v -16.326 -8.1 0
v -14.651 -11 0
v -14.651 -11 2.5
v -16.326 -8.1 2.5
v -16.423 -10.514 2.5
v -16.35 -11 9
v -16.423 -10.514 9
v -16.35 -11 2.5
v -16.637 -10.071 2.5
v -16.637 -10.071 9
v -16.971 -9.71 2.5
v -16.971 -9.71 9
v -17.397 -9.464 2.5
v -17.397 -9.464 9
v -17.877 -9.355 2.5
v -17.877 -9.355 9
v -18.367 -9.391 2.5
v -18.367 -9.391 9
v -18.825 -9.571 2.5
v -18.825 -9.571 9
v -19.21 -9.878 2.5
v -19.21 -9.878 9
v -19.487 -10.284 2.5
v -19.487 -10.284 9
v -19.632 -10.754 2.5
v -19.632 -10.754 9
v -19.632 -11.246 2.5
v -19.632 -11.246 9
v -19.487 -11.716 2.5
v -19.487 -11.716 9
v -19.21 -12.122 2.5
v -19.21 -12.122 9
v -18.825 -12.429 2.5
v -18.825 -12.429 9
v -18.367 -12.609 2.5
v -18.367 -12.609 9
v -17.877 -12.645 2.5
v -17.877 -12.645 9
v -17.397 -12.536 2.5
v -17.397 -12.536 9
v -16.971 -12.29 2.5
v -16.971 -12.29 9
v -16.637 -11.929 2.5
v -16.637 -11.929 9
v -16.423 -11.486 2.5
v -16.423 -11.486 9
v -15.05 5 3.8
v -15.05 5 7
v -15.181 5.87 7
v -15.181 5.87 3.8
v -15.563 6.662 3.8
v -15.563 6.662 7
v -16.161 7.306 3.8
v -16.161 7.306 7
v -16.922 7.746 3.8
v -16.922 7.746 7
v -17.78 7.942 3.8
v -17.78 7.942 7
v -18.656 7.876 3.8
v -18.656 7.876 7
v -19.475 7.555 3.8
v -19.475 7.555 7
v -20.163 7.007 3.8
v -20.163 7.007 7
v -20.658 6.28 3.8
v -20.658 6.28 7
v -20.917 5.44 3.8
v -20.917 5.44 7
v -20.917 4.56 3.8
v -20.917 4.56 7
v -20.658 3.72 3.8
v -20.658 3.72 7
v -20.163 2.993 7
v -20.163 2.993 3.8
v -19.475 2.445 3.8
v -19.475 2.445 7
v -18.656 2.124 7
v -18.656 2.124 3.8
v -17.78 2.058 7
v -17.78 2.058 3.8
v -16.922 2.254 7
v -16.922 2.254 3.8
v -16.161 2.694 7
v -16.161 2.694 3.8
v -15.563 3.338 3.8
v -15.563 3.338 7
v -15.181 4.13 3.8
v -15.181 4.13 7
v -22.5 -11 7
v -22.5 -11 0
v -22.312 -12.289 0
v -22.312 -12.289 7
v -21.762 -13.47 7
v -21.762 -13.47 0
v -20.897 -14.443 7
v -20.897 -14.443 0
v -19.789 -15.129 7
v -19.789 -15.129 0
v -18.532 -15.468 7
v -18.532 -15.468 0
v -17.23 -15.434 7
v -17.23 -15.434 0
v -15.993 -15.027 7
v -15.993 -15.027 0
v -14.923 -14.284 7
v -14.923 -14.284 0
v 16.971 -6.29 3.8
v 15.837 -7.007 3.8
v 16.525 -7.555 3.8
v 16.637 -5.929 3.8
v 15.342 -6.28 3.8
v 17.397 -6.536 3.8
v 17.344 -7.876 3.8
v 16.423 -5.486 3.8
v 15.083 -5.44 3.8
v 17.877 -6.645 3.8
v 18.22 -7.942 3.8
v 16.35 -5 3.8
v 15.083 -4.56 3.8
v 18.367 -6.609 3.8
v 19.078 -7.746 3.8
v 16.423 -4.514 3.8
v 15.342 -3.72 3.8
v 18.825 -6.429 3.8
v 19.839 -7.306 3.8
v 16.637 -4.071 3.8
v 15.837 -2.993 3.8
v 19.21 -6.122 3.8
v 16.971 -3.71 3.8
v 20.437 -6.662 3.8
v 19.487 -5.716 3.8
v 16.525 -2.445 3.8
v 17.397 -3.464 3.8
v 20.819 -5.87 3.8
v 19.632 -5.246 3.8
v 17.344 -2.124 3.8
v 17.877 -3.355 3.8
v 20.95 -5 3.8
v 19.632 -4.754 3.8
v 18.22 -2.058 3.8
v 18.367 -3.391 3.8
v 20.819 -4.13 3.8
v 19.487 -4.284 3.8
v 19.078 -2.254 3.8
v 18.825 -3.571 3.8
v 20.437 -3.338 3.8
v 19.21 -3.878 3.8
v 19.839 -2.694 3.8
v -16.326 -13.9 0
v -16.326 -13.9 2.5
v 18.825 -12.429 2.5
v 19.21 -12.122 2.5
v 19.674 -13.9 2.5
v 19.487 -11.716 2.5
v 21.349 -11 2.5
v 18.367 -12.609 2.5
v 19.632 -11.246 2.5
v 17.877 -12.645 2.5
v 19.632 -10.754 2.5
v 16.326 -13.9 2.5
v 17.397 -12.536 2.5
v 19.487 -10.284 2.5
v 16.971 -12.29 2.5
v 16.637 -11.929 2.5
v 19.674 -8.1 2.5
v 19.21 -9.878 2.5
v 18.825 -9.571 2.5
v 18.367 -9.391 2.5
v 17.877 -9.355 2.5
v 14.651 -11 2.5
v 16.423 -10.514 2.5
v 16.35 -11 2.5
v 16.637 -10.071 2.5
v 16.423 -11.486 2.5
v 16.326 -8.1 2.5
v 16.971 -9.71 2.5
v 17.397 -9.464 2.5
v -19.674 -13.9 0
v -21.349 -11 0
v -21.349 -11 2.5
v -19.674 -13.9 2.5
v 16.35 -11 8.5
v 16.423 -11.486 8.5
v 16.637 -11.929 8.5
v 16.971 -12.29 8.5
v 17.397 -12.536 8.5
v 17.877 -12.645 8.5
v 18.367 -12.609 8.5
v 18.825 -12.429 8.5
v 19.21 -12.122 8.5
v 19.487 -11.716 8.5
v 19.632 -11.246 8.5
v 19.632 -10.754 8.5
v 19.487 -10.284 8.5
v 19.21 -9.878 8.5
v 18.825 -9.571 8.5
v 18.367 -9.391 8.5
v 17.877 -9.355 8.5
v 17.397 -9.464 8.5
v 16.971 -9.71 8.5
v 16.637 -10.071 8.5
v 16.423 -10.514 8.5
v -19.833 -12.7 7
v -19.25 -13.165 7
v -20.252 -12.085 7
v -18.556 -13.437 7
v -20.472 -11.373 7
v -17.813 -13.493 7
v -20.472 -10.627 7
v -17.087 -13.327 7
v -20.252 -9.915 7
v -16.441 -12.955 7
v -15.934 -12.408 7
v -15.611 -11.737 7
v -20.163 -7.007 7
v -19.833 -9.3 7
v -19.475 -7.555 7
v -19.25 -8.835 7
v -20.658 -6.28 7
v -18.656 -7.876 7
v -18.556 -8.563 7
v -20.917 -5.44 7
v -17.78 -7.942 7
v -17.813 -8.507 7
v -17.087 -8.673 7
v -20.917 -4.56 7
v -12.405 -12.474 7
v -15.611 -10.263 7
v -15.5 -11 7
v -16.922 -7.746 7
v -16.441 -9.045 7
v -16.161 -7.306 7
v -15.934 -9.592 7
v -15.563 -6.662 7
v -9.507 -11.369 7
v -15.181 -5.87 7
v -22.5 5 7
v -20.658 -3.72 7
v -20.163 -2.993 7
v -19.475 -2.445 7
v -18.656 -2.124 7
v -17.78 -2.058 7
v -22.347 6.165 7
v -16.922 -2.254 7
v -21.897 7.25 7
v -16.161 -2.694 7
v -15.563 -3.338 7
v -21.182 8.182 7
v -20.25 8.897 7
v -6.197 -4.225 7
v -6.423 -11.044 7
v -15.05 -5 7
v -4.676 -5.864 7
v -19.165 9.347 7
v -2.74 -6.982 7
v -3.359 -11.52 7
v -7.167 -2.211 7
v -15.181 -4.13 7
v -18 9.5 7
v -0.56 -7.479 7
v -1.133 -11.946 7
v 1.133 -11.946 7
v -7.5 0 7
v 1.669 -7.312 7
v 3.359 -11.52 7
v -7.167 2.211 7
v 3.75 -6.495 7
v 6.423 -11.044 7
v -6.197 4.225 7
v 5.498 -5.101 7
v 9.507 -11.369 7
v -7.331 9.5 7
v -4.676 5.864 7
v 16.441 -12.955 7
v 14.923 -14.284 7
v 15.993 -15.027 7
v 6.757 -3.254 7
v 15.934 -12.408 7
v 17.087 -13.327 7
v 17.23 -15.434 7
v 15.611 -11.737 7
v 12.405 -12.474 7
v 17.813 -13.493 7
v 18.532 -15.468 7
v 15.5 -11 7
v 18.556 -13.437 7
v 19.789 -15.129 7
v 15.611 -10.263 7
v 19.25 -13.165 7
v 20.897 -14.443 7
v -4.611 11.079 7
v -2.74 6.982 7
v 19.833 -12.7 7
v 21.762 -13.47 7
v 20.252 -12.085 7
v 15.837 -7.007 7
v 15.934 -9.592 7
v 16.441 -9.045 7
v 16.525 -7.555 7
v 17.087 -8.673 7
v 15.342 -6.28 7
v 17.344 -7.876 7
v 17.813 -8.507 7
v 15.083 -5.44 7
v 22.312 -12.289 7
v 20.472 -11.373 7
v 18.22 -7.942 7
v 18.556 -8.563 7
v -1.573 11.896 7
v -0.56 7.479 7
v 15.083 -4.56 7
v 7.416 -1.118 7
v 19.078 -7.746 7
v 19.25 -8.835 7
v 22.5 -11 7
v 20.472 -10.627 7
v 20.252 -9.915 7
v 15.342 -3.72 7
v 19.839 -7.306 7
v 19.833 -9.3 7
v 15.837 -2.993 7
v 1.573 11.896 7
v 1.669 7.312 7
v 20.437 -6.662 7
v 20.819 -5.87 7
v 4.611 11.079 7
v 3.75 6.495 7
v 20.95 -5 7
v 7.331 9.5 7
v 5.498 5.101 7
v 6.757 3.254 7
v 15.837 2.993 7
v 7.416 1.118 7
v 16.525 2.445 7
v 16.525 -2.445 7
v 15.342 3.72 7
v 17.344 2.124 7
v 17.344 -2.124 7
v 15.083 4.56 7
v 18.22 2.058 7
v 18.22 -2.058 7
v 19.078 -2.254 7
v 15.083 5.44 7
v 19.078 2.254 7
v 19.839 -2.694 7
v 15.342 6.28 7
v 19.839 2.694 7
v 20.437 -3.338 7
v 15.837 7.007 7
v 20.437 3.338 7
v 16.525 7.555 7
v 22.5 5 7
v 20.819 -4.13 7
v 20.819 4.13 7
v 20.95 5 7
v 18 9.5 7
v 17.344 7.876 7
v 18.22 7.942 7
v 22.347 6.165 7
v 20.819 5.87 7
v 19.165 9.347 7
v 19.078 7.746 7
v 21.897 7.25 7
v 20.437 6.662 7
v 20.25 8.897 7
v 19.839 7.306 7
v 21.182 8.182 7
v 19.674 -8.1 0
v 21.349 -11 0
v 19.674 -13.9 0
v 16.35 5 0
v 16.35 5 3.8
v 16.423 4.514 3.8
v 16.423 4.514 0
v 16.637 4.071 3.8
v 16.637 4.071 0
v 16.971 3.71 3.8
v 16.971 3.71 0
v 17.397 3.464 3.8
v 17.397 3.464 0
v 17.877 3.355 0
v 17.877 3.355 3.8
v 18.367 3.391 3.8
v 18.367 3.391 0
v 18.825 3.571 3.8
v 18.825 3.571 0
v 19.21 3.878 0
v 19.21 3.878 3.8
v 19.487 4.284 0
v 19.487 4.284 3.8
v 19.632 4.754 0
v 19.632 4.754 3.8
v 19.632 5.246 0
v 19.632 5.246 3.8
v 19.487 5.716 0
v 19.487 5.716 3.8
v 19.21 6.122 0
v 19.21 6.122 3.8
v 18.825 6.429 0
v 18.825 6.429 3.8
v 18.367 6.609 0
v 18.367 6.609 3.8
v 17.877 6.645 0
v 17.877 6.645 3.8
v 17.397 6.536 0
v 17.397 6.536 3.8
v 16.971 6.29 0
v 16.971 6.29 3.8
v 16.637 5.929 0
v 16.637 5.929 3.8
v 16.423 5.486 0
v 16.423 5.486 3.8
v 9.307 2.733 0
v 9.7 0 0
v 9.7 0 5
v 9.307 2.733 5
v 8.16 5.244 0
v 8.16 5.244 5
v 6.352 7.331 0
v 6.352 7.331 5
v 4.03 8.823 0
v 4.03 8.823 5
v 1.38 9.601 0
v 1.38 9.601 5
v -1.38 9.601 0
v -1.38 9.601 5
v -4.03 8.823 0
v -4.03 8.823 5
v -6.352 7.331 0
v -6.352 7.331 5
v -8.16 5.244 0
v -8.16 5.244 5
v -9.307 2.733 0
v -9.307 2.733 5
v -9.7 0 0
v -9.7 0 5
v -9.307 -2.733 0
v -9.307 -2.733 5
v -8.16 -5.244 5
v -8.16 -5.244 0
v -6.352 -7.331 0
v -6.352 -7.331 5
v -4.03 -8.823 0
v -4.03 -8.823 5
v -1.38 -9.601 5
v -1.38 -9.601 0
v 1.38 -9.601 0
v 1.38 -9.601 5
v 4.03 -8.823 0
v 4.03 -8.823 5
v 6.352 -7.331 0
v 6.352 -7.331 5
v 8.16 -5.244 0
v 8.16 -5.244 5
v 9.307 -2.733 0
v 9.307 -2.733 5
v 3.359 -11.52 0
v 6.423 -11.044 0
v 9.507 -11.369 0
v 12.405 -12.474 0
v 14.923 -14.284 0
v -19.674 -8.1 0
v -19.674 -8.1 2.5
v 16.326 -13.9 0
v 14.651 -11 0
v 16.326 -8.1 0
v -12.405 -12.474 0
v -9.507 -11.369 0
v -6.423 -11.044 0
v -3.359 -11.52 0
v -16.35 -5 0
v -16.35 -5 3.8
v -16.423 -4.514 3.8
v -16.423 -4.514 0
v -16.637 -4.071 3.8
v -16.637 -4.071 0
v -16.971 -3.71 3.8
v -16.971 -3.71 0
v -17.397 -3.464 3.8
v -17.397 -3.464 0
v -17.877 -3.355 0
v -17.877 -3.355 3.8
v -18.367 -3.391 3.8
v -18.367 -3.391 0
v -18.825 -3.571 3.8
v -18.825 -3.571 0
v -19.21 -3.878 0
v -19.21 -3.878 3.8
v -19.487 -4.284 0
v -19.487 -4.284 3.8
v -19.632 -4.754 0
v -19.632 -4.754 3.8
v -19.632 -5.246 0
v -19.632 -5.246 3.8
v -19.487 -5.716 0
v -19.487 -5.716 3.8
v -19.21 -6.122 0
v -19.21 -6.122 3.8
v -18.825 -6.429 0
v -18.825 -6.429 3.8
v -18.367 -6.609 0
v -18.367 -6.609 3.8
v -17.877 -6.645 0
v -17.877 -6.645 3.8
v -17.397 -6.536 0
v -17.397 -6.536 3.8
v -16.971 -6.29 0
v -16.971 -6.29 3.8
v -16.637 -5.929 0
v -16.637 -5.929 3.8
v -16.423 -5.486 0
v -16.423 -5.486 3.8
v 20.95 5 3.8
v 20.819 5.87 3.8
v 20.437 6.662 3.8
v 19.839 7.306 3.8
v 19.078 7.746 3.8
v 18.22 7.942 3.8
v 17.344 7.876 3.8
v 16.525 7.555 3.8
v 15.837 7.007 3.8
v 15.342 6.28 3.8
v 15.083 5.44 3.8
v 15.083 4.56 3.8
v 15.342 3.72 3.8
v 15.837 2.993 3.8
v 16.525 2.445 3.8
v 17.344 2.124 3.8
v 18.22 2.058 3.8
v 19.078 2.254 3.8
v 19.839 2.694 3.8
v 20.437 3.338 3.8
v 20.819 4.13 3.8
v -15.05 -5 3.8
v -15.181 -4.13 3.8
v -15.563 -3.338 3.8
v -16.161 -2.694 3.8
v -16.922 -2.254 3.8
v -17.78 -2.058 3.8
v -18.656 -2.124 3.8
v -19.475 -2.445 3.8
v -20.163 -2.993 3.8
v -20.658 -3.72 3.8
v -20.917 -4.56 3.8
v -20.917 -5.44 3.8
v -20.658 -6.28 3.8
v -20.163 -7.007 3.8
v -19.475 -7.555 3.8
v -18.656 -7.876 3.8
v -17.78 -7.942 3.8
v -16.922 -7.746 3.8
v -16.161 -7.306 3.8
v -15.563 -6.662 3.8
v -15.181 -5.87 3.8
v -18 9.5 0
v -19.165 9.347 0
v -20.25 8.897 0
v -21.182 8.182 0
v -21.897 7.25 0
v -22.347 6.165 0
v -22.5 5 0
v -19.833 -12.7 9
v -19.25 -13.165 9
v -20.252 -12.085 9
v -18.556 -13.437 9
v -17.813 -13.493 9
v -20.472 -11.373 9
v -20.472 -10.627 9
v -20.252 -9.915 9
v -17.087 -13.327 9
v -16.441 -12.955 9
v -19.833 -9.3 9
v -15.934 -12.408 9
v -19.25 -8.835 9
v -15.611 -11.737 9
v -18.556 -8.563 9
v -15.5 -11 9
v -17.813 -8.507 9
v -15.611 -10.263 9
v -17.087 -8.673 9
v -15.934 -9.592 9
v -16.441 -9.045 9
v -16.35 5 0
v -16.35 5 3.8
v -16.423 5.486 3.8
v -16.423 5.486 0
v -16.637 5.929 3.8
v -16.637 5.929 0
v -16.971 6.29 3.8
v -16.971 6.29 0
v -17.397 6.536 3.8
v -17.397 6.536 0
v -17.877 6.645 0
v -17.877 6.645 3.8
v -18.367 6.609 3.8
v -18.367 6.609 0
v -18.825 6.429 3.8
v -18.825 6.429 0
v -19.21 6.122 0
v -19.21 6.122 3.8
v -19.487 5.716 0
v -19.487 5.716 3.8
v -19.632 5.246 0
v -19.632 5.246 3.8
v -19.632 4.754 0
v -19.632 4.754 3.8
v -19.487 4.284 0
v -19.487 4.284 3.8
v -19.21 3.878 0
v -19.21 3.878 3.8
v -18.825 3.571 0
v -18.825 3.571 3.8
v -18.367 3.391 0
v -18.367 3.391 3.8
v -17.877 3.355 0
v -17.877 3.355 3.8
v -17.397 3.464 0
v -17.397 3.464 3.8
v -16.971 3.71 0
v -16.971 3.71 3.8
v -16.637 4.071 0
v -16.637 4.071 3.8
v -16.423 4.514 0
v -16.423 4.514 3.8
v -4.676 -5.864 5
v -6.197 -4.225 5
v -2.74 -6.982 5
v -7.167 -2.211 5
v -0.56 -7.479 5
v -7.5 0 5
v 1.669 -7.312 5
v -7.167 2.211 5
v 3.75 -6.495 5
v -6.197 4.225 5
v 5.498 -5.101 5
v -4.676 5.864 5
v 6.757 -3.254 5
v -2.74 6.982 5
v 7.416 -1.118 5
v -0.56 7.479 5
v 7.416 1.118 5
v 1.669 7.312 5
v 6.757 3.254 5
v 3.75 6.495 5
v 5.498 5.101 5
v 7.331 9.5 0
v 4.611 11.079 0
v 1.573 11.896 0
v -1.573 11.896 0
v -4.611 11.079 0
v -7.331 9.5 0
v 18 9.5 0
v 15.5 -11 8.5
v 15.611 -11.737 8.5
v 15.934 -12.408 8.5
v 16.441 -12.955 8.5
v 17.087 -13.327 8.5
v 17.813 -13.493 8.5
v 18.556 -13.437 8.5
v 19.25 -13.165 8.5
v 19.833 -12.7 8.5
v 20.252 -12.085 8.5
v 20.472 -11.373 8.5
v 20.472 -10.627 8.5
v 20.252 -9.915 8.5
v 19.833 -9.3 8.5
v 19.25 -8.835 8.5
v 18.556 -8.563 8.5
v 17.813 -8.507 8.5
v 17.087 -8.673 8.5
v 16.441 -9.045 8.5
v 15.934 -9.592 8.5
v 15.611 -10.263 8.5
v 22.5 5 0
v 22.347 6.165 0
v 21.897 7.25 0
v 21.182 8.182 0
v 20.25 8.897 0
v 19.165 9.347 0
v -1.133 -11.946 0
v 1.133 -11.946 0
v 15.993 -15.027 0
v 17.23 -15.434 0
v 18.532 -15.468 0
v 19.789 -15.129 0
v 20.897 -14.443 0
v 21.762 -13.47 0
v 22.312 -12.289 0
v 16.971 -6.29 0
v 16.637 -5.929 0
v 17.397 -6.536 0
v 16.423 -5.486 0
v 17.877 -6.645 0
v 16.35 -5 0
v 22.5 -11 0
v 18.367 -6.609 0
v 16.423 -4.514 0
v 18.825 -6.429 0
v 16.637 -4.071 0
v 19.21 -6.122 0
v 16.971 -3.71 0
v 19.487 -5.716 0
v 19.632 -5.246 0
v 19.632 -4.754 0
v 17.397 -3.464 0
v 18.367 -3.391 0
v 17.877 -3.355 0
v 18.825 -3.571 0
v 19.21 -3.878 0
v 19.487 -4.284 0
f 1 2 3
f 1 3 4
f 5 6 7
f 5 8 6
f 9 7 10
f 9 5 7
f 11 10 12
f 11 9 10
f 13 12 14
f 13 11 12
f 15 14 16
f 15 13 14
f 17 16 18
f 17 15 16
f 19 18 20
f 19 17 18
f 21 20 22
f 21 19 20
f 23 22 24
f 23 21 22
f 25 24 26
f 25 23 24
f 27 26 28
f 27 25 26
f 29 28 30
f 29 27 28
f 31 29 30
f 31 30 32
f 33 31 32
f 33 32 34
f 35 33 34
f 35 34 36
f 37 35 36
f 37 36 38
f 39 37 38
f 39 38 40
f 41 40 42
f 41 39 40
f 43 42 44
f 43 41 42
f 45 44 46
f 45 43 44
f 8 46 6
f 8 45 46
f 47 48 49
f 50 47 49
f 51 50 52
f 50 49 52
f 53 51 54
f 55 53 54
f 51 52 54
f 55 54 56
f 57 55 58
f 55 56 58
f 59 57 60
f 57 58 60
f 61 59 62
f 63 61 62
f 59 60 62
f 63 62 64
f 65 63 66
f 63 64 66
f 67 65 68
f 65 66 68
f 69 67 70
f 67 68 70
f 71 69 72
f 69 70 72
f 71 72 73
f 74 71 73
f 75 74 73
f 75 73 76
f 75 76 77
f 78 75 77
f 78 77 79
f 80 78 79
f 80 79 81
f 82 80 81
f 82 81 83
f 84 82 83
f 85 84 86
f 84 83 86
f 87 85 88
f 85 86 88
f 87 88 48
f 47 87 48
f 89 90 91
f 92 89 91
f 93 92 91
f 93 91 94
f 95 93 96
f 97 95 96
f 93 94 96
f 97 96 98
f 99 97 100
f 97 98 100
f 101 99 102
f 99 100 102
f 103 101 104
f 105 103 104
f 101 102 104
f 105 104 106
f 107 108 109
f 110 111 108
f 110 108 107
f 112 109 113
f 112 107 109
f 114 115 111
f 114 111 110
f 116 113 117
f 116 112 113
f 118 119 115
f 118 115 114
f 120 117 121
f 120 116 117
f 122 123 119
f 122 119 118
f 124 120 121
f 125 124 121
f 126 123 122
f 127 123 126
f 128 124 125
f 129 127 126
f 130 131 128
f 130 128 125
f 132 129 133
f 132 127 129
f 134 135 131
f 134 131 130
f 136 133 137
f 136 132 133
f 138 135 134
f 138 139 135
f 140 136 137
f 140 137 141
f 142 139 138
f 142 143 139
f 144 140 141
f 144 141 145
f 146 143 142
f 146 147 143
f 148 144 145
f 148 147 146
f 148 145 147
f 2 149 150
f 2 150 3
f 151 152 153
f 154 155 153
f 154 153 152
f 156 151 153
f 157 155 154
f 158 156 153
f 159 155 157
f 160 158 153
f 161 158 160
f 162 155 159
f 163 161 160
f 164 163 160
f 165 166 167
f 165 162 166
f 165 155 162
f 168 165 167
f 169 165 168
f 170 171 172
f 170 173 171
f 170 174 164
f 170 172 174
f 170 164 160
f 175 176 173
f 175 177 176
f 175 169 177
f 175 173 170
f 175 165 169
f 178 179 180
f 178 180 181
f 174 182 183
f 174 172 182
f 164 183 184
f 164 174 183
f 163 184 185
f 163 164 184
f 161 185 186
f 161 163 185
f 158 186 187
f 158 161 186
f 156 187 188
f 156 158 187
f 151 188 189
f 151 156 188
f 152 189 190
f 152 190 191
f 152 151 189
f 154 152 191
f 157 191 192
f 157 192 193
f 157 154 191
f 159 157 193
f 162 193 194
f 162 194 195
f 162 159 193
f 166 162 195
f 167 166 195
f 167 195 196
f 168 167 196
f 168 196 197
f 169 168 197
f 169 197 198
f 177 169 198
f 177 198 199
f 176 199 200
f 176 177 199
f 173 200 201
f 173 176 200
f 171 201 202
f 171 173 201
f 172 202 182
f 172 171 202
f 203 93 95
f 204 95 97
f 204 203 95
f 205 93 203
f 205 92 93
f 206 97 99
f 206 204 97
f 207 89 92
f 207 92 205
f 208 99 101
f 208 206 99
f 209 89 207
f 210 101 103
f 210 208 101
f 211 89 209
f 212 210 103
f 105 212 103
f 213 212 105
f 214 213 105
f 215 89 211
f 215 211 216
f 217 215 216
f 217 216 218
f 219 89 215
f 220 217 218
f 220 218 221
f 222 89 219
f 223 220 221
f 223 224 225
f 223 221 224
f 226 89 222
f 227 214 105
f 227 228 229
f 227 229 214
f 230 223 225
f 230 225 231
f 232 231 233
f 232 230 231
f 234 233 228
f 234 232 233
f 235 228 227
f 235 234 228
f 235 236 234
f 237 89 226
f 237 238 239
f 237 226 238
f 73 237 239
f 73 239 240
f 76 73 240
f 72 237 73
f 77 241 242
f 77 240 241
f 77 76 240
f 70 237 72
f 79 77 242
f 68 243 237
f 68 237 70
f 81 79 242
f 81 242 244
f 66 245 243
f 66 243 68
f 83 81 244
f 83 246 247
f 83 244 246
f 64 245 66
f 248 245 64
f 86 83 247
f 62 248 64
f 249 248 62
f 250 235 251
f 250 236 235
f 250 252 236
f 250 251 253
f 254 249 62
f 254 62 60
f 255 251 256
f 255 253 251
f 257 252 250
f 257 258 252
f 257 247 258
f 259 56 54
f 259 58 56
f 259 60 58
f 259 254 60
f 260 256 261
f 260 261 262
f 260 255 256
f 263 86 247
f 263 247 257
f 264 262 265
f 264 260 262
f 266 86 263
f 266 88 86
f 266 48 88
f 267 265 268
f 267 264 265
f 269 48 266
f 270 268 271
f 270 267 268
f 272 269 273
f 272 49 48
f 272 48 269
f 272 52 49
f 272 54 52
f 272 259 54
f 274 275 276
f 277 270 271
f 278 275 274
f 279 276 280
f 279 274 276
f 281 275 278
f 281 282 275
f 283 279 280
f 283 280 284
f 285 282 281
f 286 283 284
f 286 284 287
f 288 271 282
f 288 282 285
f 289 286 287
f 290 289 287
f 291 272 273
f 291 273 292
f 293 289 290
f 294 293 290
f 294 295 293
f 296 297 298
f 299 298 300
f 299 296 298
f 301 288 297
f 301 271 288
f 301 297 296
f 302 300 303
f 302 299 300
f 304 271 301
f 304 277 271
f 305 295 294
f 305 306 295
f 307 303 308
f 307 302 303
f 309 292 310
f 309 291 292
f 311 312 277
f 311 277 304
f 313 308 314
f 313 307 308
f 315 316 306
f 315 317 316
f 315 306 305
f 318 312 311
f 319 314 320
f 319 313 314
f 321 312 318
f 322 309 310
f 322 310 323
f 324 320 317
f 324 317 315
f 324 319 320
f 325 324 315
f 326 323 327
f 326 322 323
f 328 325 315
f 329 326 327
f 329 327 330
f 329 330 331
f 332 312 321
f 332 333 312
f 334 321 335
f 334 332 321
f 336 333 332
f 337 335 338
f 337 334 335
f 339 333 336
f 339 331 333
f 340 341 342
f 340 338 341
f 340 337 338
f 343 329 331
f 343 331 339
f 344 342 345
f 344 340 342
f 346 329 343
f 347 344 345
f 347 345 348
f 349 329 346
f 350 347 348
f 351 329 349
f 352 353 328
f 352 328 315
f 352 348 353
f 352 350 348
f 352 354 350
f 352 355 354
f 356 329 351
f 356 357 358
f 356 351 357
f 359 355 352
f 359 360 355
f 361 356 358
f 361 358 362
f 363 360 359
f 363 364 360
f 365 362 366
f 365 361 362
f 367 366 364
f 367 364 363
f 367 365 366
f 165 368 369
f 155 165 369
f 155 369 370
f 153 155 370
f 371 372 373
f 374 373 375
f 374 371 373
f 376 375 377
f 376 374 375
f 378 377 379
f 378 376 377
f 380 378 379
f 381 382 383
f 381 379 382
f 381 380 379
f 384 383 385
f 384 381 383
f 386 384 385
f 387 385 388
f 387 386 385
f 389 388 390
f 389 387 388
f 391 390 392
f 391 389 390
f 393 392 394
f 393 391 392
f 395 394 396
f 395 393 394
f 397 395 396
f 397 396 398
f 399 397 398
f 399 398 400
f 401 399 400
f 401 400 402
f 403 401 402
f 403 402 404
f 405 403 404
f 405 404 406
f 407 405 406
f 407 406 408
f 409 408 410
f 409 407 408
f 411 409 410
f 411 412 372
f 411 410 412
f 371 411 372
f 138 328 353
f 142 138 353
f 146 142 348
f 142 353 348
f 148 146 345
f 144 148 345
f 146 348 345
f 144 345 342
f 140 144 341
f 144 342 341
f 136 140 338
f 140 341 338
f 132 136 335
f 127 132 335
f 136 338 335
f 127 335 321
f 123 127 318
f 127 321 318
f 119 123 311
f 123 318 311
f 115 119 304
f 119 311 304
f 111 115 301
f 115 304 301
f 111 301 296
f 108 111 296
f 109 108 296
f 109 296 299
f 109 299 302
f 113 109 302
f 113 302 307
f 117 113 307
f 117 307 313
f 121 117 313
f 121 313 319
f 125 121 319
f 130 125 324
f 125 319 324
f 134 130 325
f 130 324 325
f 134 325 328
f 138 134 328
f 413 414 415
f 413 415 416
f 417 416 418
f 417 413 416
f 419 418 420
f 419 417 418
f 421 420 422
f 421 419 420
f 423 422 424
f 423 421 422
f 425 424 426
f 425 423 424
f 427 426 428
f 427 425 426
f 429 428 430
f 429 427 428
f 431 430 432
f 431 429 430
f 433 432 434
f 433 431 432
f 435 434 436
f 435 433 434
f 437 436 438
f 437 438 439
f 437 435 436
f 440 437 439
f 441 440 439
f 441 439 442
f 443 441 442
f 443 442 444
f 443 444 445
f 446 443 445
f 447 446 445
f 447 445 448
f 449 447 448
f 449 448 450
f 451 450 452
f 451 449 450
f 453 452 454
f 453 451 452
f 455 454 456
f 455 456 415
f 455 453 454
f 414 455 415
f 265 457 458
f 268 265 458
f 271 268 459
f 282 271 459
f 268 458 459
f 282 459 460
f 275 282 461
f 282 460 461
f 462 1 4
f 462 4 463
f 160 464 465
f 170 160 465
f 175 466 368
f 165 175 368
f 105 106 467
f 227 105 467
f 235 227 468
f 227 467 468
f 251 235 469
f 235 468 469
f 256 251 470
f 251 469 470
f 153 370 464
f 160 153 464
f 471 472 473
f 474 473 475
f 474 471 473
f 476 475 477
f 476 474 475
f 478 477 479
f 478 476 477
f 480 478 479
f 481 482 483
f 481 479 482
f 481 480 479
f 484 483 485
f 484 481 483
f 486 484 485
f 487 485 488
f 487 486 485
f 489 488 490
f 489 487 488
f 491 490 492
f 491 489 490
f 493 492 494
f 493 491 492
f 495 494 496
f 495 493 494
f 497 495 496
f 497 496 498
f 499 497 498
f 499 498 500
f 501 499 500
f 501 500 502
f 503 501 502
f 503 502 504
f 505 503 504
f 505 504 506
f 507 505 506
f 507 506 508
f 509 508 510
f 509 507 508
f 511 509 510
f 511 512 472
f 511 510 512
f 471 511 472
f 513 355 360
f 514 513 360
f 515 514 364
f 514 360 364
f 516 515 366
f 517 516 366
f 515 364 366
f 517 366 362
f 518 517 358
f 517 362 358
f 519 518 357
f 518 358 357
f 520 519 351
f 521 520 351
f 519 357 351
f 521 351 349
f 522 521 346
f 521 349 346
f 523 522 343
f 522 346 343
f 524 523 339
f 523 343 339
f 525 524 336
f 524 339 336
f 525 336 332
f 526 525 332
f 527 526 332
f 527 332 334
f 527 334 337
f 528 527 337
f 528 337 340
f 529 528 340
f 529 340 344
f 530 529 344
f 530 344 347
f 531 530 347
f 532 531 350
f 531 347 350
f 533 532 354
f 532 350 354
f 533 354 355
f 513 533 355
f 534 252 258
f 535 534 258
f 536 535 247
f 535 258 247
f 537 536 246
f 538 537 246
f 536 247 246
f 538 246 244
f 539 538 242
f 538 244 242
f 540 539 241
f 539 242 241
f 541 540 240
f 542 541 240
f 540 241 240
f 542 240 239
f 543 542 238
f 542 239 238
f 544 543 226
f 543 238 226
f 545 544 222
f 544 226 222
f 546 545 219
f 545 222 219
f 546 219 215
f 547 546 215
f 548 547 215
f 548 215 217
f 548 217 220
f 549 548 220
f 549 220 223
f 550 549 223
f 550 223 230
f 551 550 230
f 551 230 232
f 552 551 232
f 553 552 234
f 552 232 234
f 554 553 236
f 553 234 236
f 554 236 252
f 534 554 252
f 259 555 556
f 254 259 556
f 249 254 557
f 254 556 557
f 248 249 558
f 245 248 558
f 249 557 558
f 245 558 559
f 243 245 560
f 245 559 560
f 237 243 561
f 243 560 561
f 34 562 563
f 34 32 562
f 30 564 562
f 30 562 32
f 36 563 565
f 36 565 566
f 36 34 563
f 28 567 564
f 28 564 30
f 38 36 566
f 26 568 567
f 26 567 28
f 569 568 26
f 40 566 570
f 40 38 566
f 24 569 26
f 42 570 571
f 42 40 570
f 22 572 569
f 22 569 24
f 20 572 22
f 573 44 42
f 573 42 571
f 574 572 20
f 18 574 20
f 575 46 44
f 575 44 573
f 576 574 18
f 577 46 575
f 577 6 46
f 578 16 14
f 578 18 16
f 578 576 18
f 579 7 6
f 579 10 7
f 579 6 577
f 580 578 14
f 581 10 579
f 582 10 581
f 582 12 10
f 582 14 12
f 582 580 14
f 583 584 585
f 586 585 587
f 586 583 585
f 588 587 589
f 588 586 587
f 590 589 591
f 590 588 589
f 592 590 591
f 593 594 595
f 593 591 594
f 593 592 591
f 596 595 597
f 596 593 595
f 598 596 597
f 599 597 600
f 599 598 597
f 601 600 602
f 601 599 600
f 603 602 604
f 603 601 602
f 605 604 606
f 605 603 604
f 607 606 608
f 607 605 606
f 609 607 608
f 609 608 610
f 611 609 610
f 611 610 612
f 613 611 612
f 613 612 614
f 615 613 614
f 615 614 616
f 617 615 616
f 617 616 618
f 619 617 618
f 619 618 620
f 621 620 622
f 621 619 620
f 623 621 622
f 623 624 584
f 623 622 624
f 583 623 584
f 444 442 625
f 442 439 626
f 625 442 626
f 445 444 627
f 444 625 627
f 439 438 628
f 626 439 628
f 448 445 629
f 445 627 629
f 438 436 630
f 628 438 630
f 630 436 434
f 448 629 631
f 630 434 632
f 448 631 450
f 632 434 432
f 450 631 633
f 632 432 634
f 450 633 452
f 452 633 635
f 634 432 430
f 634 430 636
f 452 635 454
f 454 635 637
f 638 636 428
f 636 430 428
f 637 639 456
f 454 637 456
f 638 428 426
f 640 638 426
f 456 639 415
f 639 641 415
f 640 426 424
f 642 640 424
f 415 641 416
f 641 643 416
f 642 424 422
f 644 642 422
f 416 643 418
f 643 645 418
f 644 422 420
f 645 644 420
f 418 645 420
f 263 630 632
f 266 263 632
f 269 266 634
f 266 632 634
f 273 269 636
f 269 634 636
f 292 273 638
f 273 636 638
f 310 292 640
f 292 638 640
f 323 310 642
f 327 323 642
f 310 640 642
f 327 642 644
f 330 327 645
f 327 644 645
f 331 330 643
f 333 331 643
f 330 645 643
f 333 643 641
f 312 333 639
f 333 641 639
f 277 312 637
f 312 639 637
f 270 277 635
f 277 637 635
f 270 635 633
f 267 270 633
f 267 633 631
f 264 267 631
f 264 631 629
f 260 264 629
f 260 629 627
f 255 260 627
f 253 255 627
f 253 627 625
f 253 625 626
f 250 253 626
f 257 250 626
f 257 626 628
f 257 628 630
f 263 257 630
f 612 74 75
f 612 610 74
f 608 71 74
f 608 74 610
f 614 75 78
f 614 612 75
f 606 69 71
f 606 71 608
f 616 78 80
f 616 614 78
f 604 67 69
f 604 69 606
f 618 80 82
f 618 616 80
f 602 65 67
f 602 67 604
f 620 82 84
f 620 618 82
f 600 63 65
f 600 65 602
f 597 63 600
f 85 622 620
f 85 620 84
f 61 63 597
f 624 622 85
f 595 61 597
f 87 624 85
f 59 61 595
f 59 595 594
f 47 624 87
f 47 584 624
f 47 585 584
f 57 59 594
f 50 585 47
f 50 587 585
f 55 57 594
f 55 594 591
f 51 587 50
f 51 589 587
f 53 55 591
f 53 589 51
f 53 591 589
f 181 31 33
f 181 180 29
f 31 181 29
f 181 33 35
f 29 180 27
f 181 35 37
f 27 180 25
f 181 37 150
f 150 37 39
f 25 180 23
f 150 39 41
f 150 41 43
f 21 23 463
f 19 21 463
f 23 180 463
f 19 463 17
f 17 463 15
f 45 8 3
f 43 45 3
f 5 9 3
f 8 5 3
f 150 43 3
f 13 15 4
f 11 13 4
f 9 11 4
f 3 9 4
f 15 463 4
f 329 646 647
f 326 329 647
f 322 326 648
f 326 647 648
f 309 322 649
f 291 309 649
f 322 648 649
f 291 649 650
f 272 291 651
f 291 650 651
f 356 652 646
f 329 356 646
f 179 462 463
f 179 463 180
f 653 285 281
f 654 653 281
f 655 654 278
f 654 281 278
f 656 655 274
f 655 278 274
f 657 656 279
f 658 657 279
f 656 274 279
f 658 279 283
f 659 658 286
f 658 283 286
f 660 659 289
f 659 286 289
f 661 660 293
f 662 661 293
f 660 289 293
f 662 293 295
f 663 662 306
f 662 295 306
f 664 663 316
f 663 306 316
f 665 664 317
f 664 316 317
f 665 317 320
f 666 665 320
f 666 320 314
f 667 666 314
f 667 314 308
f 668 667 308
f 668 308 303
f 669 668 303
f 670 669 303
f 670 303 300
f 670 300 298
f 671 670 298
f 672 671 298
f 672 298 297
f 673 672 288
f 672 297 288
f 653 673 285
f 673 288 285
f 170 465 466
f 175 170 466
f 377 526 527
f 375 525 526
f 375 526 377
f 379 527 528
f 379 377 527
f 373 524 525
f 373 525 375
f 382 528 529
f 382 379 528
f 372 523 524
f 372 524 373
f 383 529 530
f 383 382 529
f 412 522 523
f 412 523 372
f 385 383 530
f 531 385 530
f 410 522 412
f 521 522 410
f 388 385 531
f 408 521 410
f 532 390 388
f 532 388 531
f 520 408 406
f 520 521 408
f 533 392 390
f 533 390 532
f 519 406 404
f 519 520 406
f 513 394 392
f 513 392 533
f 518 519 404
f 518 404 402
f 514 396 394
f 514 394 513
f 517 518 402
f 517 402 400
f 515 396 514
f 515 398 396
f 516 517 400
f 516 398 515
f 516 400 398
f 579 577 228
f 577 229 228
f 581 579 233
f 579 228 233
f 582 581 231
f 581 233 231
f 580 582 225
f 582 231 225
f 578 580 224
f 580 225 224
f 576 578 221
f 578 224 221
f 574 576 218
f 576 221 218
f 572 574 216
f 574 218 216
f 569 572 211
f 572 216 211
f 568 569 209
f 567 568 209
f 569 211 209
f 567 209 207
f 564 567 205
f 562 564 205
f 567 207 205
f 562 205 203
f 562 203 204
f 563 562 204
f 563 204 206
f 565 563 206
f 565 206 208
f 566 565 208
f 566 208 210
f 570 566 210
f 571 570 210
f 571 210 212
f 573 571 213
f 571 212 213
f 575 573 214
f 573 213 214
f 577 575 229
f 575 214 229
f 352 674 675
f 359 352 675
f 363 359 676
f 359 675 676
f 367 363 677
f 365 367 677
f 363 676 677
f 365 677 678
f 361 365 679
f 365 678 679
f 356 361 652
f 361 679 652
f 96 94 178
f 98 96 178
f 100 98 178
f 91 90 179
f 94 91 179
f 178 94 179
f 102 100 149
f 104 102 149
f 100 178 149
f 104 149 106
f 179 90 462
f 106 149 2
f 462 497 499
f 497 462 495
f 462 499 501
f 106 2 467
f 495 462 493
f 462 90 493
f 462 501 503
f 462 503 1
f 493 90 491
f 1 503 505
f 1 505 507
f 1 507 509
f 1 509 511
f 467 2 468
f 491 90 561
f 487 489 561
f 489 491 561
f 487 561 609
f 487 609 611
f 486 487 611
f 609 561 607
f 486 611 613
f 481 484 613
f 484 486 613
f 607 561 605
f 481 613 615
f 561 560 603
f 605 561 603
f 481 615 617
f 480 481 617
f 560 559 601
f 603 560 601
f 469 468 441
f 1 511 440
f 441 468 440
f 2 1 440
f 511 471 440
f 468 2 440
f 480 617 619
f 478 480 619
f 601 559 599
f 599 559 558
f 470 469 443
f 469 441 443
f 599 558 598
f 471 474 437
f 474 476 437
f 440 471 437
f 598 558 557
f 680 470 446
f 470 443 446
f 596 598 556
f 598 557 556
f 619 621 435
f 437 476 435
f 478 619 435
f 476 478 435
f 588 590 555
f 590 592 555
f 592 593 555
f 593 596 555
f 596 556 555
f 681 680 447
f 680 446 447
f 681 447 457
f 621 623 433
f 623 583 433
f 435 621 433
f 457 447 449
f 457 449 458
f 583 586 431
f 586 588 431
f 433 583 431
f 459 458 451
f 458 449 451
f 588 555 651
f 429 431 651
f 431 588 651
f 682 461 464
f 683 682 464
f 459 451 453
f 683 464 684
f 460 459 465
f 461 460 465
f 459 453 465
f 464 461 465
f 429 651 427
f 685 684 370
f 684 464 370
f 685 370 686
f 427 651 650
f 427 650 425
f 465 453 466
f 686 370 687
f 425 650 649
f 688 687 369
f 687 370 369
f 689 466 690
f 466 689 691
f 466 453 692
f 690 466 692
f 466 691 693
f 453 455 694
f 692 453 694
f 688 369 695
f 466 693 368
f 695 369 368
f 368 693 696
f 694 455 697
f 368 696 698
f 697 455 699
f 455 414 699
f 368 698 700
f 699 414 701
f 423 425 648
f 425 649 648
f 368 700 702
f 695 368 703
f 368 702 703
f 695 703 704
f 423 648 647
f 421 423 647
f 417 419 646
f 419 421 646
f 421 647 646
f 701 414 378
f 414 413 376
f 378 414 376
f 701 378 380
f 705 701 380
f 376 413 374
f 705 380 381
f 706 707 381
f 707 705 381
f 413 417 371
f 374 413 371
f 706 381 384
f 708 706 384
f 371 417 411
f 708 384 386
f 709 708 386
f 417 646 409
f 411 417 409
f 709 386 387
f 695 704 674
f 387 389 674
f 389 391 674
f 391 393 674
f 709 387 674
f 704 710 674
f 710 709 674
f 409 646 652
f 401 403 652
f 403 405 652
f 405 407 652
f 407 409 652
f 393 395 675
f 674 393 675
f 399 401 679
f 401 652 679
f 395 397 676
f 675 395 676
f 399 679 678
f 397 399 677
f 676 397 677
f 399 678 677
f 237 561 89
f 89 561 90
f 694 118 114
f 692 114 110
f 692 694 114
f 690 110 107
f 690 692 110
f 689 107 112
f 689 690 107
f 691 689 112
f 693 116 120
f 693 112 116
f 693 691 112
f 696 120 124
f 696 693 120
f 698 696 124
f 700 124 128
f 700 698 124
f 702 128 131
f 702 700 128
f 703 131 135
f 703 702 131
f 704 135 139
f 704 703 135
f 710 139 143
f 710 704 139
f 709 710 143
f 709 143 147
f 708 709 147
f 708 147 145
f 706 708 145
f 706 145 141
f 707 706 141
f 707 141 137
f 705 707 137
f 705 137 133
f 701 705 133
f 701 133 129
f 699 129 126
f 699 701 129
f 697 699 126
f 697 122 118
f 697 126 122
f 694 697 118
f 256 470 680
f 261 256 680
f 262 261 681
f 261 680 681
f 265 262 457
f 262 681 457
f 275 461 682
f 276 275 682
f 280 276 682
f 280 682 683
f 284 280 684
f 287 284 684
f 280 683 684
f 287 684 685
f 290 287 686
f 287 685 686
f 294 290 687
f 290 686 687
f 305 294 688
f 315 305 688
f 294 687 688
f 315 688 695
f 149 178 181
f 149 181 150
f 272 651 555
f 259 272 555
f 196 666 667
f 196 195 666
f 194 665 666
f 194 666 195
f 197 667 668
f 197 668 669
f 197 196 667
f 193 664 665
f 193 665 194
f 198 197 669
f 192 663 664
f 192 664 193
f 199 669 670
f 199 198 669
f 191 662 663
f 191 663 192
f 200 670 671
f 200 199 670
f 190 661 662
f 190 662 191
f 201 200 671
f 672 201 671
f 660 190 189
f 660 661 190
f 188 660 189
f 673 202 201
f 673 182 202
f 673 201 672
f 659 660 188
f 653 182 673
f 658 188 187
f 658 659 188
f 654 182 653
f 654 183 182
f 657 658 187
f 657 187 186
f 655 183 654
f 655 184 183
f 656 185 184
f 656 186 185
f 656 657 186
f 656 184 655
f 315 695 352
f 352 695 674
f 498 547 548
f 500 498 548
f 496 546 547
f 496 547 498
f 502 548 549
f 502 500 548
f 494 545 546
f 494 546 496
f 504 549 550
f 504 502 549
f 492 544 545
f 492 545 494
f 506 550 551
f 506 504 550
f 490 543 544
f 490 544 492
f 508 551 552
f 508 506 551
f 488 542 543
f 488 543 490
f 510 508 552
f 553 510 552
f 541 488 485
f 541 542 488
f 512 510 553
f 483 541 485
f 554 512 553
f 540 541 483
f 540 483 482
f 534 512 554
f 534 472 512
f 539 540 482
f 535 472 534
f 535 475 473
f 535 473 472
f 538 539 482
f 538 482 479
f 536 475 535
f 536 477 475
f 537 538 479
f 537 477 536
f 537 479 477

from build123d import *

# Parameters (mm, degrees)
SKETCH2_R           = 1.65
BOSS_EXTRUDE1_DEPTH = 7
SKETCH3_R           = 9.7
CUT_EXTRUDE1_DEPTH  = 5
SKETCH4_R           = 7.5
CUT_EXTRUDE2_DEPTH  = 5
CUT_EXTRUDE3_DEPTH  = 2.5
SKETCH8_R           = 2.95
CUT_EXTRUDE4_DEPTH  = 3.2
SKETCH9_R           = 2.5
SKETCH9_R_2         = 1.65
BOSS_EXTRUDE2_DEPTH = 1.5
MOVE_FACE1_BY       = 0.5


with BuildPart() as part:
    # Sketch2 → Boss-Extrude1 (new body)
    with BuildSketch(Plane.XY):
        with BuildLine():
            Line((-7.331439149, 9.5), (-18, 9.5))
            ThreePointArc((-18, 9.5), (-21.181980515, 8.181980515), (-22.5, 5))
            Line((-22.5, 5), (-22.5, -11))
            ThreePointArc((-22.5, -11), (-19.789453748, -15.128904853), (-14.92317543, -14.283770784))
            ThreePointArc((-14.92317543, -14.283770784), (-9.507484415, -11.369138817), (-3.359154955, -11.520246438))
            ThreePointArc((-3.359154955, -11.520246438), (0, -12), (3.359154955, -11.520246438))
            ThreePointArc((3.359154955, -11.520246438), (9.507484415, -11.369138817), (14.92317543, -14.283770784))
            ThreePointArc((14.92317543, -14.283770784), (19.789453748, -15.128904853), (22.5, -11))
            Line((22.5, -11), (22.5, 5))
            ThreePointArc((22.5, 5), (21.181980515, 8.181980515), (18, 9.5))
            Line((18, 9.5), (7.331439149, 9.5))
            ThreePointArc((7.331439149, 9.5), (0, 12), (-7.331439149, 9.5))
        make_face()
        with Locations((-18, 5)):
            Circle(SKETCH2_R, mode=Mode.SUBTRACT)
        with Locations((-18, -11)):
            Circle(SKETCH2_R, mode=Mode.SUBTRACT)
        with Locations((-18, -5)):
            Circle(SKETCH2_R, mode=Mode.SUBTRACT)
        with Locations(Location((18, -5, 0), (0, 0, 180))):
            Circle(SKETCH2_R, mode=Mode.SUBTRACT)
        with Locations(Location((18, -11, 0), (0, 0, 180))):
            Circle(SKETCH2_R, mode=Mode.SUBTRACT)
        with Locations(Location((18, 5, 0), (0, 0, 180))):
            Circle(SKETCH2_R, mode=Mode.SUBTRACT)
    extrude(amount=BOSS_EXTRUDE1_DEPTH)

    # Sketch3 → Cut-Extrude1 (cut)
    with BuildSketch(Plane.XY):
        Circle(SKETCH3_R)
    extrude(amount=CUT_EXTRUDE1_DEPTH, mode=Mode.SUBTRACT)

    # Sketch4 → Cut-Extrude2 (cut)
    with BuildSketch(Plane(origin=(0, 0, 5), x_dir=(-1, 0, 0), z_dir=(0, 0, -1))):
        Circle(SKETCH4_R)
    extrude(amount=-CUT_EXTRUDE2_DEPTH, mode=Mode.SUBTRACT)

    # Sketch6 → Cut-Extrude3 (cut)
    with BuildSketch(Plane(origin=(0, 0, 0), x_dir=(-1, 0, 0), z_dir=(0, 0, -1))):
        Polygon((-16.325684219, -8.1), (-19.674315781, -8.1), (-21.348631561, -11), (-19.674315781, -13.9), (-16.325684219, -13.9), (-14.651368439, -11), align=None)
        Polygon((14.651368439, -11), (16.325684219, -8.1), (19.674315781, -8.1), (21.348631561, -11), (19.674315781, -13.9), (16.325684219, -13.9), align=None)
    extrude(amount=-CUT_EXTRUDE3_DEPTH, mode=Mode.SUBTRACT)

    # Sketch8 → Cut-Extrude4 (cut)
    with BuildSketch(Plane.XY.offset(7)):
        with Locations((18, -5)):
            Circle(SKETCH8_R)
        with Locations((18, 5)):
            Circle(SKETCH8_R)
        with Locations((-18, 5)):
            Circle(SKETCH8_R)
        with Locations((-18, -5)):
            Circle(SKETCH8_R)
    extrude(amount=-CUT_EXTRUDE4_DEPTH, mode=Mode.SUBTRACT)

    # Sketch9 → Boss-Extrude2 (add)
    with BuildSketch(Plane.XY.offset(7)):
        with Locations((-18, -11)):
            Circle(SKETCH9_R)
        with Locations((-18, -11)):
            Circle(SKETCH9_R_2, mode=Mode.SUBTRACT)
        with Locations(Location((18, -11, 0), (0, 0, 180))):
            Circle(SKETCH9_R)
        with Locations(Location((18, -11, 0), (0, 0, 180))):
            Circle(SKETCH9_R_2, mode=Mode.SUBTRACT)
    extrude(amount=BOSS_EXTRUDE2_DEPTH)

    # Move Face1: a face moved outward by 0.5
    extrude(part.faces().sort_by_distance((-18, -13, 8.5))[0], amount=MOVE_FACE1_BY, dir=(0, 0, 1))


solid = part.part
